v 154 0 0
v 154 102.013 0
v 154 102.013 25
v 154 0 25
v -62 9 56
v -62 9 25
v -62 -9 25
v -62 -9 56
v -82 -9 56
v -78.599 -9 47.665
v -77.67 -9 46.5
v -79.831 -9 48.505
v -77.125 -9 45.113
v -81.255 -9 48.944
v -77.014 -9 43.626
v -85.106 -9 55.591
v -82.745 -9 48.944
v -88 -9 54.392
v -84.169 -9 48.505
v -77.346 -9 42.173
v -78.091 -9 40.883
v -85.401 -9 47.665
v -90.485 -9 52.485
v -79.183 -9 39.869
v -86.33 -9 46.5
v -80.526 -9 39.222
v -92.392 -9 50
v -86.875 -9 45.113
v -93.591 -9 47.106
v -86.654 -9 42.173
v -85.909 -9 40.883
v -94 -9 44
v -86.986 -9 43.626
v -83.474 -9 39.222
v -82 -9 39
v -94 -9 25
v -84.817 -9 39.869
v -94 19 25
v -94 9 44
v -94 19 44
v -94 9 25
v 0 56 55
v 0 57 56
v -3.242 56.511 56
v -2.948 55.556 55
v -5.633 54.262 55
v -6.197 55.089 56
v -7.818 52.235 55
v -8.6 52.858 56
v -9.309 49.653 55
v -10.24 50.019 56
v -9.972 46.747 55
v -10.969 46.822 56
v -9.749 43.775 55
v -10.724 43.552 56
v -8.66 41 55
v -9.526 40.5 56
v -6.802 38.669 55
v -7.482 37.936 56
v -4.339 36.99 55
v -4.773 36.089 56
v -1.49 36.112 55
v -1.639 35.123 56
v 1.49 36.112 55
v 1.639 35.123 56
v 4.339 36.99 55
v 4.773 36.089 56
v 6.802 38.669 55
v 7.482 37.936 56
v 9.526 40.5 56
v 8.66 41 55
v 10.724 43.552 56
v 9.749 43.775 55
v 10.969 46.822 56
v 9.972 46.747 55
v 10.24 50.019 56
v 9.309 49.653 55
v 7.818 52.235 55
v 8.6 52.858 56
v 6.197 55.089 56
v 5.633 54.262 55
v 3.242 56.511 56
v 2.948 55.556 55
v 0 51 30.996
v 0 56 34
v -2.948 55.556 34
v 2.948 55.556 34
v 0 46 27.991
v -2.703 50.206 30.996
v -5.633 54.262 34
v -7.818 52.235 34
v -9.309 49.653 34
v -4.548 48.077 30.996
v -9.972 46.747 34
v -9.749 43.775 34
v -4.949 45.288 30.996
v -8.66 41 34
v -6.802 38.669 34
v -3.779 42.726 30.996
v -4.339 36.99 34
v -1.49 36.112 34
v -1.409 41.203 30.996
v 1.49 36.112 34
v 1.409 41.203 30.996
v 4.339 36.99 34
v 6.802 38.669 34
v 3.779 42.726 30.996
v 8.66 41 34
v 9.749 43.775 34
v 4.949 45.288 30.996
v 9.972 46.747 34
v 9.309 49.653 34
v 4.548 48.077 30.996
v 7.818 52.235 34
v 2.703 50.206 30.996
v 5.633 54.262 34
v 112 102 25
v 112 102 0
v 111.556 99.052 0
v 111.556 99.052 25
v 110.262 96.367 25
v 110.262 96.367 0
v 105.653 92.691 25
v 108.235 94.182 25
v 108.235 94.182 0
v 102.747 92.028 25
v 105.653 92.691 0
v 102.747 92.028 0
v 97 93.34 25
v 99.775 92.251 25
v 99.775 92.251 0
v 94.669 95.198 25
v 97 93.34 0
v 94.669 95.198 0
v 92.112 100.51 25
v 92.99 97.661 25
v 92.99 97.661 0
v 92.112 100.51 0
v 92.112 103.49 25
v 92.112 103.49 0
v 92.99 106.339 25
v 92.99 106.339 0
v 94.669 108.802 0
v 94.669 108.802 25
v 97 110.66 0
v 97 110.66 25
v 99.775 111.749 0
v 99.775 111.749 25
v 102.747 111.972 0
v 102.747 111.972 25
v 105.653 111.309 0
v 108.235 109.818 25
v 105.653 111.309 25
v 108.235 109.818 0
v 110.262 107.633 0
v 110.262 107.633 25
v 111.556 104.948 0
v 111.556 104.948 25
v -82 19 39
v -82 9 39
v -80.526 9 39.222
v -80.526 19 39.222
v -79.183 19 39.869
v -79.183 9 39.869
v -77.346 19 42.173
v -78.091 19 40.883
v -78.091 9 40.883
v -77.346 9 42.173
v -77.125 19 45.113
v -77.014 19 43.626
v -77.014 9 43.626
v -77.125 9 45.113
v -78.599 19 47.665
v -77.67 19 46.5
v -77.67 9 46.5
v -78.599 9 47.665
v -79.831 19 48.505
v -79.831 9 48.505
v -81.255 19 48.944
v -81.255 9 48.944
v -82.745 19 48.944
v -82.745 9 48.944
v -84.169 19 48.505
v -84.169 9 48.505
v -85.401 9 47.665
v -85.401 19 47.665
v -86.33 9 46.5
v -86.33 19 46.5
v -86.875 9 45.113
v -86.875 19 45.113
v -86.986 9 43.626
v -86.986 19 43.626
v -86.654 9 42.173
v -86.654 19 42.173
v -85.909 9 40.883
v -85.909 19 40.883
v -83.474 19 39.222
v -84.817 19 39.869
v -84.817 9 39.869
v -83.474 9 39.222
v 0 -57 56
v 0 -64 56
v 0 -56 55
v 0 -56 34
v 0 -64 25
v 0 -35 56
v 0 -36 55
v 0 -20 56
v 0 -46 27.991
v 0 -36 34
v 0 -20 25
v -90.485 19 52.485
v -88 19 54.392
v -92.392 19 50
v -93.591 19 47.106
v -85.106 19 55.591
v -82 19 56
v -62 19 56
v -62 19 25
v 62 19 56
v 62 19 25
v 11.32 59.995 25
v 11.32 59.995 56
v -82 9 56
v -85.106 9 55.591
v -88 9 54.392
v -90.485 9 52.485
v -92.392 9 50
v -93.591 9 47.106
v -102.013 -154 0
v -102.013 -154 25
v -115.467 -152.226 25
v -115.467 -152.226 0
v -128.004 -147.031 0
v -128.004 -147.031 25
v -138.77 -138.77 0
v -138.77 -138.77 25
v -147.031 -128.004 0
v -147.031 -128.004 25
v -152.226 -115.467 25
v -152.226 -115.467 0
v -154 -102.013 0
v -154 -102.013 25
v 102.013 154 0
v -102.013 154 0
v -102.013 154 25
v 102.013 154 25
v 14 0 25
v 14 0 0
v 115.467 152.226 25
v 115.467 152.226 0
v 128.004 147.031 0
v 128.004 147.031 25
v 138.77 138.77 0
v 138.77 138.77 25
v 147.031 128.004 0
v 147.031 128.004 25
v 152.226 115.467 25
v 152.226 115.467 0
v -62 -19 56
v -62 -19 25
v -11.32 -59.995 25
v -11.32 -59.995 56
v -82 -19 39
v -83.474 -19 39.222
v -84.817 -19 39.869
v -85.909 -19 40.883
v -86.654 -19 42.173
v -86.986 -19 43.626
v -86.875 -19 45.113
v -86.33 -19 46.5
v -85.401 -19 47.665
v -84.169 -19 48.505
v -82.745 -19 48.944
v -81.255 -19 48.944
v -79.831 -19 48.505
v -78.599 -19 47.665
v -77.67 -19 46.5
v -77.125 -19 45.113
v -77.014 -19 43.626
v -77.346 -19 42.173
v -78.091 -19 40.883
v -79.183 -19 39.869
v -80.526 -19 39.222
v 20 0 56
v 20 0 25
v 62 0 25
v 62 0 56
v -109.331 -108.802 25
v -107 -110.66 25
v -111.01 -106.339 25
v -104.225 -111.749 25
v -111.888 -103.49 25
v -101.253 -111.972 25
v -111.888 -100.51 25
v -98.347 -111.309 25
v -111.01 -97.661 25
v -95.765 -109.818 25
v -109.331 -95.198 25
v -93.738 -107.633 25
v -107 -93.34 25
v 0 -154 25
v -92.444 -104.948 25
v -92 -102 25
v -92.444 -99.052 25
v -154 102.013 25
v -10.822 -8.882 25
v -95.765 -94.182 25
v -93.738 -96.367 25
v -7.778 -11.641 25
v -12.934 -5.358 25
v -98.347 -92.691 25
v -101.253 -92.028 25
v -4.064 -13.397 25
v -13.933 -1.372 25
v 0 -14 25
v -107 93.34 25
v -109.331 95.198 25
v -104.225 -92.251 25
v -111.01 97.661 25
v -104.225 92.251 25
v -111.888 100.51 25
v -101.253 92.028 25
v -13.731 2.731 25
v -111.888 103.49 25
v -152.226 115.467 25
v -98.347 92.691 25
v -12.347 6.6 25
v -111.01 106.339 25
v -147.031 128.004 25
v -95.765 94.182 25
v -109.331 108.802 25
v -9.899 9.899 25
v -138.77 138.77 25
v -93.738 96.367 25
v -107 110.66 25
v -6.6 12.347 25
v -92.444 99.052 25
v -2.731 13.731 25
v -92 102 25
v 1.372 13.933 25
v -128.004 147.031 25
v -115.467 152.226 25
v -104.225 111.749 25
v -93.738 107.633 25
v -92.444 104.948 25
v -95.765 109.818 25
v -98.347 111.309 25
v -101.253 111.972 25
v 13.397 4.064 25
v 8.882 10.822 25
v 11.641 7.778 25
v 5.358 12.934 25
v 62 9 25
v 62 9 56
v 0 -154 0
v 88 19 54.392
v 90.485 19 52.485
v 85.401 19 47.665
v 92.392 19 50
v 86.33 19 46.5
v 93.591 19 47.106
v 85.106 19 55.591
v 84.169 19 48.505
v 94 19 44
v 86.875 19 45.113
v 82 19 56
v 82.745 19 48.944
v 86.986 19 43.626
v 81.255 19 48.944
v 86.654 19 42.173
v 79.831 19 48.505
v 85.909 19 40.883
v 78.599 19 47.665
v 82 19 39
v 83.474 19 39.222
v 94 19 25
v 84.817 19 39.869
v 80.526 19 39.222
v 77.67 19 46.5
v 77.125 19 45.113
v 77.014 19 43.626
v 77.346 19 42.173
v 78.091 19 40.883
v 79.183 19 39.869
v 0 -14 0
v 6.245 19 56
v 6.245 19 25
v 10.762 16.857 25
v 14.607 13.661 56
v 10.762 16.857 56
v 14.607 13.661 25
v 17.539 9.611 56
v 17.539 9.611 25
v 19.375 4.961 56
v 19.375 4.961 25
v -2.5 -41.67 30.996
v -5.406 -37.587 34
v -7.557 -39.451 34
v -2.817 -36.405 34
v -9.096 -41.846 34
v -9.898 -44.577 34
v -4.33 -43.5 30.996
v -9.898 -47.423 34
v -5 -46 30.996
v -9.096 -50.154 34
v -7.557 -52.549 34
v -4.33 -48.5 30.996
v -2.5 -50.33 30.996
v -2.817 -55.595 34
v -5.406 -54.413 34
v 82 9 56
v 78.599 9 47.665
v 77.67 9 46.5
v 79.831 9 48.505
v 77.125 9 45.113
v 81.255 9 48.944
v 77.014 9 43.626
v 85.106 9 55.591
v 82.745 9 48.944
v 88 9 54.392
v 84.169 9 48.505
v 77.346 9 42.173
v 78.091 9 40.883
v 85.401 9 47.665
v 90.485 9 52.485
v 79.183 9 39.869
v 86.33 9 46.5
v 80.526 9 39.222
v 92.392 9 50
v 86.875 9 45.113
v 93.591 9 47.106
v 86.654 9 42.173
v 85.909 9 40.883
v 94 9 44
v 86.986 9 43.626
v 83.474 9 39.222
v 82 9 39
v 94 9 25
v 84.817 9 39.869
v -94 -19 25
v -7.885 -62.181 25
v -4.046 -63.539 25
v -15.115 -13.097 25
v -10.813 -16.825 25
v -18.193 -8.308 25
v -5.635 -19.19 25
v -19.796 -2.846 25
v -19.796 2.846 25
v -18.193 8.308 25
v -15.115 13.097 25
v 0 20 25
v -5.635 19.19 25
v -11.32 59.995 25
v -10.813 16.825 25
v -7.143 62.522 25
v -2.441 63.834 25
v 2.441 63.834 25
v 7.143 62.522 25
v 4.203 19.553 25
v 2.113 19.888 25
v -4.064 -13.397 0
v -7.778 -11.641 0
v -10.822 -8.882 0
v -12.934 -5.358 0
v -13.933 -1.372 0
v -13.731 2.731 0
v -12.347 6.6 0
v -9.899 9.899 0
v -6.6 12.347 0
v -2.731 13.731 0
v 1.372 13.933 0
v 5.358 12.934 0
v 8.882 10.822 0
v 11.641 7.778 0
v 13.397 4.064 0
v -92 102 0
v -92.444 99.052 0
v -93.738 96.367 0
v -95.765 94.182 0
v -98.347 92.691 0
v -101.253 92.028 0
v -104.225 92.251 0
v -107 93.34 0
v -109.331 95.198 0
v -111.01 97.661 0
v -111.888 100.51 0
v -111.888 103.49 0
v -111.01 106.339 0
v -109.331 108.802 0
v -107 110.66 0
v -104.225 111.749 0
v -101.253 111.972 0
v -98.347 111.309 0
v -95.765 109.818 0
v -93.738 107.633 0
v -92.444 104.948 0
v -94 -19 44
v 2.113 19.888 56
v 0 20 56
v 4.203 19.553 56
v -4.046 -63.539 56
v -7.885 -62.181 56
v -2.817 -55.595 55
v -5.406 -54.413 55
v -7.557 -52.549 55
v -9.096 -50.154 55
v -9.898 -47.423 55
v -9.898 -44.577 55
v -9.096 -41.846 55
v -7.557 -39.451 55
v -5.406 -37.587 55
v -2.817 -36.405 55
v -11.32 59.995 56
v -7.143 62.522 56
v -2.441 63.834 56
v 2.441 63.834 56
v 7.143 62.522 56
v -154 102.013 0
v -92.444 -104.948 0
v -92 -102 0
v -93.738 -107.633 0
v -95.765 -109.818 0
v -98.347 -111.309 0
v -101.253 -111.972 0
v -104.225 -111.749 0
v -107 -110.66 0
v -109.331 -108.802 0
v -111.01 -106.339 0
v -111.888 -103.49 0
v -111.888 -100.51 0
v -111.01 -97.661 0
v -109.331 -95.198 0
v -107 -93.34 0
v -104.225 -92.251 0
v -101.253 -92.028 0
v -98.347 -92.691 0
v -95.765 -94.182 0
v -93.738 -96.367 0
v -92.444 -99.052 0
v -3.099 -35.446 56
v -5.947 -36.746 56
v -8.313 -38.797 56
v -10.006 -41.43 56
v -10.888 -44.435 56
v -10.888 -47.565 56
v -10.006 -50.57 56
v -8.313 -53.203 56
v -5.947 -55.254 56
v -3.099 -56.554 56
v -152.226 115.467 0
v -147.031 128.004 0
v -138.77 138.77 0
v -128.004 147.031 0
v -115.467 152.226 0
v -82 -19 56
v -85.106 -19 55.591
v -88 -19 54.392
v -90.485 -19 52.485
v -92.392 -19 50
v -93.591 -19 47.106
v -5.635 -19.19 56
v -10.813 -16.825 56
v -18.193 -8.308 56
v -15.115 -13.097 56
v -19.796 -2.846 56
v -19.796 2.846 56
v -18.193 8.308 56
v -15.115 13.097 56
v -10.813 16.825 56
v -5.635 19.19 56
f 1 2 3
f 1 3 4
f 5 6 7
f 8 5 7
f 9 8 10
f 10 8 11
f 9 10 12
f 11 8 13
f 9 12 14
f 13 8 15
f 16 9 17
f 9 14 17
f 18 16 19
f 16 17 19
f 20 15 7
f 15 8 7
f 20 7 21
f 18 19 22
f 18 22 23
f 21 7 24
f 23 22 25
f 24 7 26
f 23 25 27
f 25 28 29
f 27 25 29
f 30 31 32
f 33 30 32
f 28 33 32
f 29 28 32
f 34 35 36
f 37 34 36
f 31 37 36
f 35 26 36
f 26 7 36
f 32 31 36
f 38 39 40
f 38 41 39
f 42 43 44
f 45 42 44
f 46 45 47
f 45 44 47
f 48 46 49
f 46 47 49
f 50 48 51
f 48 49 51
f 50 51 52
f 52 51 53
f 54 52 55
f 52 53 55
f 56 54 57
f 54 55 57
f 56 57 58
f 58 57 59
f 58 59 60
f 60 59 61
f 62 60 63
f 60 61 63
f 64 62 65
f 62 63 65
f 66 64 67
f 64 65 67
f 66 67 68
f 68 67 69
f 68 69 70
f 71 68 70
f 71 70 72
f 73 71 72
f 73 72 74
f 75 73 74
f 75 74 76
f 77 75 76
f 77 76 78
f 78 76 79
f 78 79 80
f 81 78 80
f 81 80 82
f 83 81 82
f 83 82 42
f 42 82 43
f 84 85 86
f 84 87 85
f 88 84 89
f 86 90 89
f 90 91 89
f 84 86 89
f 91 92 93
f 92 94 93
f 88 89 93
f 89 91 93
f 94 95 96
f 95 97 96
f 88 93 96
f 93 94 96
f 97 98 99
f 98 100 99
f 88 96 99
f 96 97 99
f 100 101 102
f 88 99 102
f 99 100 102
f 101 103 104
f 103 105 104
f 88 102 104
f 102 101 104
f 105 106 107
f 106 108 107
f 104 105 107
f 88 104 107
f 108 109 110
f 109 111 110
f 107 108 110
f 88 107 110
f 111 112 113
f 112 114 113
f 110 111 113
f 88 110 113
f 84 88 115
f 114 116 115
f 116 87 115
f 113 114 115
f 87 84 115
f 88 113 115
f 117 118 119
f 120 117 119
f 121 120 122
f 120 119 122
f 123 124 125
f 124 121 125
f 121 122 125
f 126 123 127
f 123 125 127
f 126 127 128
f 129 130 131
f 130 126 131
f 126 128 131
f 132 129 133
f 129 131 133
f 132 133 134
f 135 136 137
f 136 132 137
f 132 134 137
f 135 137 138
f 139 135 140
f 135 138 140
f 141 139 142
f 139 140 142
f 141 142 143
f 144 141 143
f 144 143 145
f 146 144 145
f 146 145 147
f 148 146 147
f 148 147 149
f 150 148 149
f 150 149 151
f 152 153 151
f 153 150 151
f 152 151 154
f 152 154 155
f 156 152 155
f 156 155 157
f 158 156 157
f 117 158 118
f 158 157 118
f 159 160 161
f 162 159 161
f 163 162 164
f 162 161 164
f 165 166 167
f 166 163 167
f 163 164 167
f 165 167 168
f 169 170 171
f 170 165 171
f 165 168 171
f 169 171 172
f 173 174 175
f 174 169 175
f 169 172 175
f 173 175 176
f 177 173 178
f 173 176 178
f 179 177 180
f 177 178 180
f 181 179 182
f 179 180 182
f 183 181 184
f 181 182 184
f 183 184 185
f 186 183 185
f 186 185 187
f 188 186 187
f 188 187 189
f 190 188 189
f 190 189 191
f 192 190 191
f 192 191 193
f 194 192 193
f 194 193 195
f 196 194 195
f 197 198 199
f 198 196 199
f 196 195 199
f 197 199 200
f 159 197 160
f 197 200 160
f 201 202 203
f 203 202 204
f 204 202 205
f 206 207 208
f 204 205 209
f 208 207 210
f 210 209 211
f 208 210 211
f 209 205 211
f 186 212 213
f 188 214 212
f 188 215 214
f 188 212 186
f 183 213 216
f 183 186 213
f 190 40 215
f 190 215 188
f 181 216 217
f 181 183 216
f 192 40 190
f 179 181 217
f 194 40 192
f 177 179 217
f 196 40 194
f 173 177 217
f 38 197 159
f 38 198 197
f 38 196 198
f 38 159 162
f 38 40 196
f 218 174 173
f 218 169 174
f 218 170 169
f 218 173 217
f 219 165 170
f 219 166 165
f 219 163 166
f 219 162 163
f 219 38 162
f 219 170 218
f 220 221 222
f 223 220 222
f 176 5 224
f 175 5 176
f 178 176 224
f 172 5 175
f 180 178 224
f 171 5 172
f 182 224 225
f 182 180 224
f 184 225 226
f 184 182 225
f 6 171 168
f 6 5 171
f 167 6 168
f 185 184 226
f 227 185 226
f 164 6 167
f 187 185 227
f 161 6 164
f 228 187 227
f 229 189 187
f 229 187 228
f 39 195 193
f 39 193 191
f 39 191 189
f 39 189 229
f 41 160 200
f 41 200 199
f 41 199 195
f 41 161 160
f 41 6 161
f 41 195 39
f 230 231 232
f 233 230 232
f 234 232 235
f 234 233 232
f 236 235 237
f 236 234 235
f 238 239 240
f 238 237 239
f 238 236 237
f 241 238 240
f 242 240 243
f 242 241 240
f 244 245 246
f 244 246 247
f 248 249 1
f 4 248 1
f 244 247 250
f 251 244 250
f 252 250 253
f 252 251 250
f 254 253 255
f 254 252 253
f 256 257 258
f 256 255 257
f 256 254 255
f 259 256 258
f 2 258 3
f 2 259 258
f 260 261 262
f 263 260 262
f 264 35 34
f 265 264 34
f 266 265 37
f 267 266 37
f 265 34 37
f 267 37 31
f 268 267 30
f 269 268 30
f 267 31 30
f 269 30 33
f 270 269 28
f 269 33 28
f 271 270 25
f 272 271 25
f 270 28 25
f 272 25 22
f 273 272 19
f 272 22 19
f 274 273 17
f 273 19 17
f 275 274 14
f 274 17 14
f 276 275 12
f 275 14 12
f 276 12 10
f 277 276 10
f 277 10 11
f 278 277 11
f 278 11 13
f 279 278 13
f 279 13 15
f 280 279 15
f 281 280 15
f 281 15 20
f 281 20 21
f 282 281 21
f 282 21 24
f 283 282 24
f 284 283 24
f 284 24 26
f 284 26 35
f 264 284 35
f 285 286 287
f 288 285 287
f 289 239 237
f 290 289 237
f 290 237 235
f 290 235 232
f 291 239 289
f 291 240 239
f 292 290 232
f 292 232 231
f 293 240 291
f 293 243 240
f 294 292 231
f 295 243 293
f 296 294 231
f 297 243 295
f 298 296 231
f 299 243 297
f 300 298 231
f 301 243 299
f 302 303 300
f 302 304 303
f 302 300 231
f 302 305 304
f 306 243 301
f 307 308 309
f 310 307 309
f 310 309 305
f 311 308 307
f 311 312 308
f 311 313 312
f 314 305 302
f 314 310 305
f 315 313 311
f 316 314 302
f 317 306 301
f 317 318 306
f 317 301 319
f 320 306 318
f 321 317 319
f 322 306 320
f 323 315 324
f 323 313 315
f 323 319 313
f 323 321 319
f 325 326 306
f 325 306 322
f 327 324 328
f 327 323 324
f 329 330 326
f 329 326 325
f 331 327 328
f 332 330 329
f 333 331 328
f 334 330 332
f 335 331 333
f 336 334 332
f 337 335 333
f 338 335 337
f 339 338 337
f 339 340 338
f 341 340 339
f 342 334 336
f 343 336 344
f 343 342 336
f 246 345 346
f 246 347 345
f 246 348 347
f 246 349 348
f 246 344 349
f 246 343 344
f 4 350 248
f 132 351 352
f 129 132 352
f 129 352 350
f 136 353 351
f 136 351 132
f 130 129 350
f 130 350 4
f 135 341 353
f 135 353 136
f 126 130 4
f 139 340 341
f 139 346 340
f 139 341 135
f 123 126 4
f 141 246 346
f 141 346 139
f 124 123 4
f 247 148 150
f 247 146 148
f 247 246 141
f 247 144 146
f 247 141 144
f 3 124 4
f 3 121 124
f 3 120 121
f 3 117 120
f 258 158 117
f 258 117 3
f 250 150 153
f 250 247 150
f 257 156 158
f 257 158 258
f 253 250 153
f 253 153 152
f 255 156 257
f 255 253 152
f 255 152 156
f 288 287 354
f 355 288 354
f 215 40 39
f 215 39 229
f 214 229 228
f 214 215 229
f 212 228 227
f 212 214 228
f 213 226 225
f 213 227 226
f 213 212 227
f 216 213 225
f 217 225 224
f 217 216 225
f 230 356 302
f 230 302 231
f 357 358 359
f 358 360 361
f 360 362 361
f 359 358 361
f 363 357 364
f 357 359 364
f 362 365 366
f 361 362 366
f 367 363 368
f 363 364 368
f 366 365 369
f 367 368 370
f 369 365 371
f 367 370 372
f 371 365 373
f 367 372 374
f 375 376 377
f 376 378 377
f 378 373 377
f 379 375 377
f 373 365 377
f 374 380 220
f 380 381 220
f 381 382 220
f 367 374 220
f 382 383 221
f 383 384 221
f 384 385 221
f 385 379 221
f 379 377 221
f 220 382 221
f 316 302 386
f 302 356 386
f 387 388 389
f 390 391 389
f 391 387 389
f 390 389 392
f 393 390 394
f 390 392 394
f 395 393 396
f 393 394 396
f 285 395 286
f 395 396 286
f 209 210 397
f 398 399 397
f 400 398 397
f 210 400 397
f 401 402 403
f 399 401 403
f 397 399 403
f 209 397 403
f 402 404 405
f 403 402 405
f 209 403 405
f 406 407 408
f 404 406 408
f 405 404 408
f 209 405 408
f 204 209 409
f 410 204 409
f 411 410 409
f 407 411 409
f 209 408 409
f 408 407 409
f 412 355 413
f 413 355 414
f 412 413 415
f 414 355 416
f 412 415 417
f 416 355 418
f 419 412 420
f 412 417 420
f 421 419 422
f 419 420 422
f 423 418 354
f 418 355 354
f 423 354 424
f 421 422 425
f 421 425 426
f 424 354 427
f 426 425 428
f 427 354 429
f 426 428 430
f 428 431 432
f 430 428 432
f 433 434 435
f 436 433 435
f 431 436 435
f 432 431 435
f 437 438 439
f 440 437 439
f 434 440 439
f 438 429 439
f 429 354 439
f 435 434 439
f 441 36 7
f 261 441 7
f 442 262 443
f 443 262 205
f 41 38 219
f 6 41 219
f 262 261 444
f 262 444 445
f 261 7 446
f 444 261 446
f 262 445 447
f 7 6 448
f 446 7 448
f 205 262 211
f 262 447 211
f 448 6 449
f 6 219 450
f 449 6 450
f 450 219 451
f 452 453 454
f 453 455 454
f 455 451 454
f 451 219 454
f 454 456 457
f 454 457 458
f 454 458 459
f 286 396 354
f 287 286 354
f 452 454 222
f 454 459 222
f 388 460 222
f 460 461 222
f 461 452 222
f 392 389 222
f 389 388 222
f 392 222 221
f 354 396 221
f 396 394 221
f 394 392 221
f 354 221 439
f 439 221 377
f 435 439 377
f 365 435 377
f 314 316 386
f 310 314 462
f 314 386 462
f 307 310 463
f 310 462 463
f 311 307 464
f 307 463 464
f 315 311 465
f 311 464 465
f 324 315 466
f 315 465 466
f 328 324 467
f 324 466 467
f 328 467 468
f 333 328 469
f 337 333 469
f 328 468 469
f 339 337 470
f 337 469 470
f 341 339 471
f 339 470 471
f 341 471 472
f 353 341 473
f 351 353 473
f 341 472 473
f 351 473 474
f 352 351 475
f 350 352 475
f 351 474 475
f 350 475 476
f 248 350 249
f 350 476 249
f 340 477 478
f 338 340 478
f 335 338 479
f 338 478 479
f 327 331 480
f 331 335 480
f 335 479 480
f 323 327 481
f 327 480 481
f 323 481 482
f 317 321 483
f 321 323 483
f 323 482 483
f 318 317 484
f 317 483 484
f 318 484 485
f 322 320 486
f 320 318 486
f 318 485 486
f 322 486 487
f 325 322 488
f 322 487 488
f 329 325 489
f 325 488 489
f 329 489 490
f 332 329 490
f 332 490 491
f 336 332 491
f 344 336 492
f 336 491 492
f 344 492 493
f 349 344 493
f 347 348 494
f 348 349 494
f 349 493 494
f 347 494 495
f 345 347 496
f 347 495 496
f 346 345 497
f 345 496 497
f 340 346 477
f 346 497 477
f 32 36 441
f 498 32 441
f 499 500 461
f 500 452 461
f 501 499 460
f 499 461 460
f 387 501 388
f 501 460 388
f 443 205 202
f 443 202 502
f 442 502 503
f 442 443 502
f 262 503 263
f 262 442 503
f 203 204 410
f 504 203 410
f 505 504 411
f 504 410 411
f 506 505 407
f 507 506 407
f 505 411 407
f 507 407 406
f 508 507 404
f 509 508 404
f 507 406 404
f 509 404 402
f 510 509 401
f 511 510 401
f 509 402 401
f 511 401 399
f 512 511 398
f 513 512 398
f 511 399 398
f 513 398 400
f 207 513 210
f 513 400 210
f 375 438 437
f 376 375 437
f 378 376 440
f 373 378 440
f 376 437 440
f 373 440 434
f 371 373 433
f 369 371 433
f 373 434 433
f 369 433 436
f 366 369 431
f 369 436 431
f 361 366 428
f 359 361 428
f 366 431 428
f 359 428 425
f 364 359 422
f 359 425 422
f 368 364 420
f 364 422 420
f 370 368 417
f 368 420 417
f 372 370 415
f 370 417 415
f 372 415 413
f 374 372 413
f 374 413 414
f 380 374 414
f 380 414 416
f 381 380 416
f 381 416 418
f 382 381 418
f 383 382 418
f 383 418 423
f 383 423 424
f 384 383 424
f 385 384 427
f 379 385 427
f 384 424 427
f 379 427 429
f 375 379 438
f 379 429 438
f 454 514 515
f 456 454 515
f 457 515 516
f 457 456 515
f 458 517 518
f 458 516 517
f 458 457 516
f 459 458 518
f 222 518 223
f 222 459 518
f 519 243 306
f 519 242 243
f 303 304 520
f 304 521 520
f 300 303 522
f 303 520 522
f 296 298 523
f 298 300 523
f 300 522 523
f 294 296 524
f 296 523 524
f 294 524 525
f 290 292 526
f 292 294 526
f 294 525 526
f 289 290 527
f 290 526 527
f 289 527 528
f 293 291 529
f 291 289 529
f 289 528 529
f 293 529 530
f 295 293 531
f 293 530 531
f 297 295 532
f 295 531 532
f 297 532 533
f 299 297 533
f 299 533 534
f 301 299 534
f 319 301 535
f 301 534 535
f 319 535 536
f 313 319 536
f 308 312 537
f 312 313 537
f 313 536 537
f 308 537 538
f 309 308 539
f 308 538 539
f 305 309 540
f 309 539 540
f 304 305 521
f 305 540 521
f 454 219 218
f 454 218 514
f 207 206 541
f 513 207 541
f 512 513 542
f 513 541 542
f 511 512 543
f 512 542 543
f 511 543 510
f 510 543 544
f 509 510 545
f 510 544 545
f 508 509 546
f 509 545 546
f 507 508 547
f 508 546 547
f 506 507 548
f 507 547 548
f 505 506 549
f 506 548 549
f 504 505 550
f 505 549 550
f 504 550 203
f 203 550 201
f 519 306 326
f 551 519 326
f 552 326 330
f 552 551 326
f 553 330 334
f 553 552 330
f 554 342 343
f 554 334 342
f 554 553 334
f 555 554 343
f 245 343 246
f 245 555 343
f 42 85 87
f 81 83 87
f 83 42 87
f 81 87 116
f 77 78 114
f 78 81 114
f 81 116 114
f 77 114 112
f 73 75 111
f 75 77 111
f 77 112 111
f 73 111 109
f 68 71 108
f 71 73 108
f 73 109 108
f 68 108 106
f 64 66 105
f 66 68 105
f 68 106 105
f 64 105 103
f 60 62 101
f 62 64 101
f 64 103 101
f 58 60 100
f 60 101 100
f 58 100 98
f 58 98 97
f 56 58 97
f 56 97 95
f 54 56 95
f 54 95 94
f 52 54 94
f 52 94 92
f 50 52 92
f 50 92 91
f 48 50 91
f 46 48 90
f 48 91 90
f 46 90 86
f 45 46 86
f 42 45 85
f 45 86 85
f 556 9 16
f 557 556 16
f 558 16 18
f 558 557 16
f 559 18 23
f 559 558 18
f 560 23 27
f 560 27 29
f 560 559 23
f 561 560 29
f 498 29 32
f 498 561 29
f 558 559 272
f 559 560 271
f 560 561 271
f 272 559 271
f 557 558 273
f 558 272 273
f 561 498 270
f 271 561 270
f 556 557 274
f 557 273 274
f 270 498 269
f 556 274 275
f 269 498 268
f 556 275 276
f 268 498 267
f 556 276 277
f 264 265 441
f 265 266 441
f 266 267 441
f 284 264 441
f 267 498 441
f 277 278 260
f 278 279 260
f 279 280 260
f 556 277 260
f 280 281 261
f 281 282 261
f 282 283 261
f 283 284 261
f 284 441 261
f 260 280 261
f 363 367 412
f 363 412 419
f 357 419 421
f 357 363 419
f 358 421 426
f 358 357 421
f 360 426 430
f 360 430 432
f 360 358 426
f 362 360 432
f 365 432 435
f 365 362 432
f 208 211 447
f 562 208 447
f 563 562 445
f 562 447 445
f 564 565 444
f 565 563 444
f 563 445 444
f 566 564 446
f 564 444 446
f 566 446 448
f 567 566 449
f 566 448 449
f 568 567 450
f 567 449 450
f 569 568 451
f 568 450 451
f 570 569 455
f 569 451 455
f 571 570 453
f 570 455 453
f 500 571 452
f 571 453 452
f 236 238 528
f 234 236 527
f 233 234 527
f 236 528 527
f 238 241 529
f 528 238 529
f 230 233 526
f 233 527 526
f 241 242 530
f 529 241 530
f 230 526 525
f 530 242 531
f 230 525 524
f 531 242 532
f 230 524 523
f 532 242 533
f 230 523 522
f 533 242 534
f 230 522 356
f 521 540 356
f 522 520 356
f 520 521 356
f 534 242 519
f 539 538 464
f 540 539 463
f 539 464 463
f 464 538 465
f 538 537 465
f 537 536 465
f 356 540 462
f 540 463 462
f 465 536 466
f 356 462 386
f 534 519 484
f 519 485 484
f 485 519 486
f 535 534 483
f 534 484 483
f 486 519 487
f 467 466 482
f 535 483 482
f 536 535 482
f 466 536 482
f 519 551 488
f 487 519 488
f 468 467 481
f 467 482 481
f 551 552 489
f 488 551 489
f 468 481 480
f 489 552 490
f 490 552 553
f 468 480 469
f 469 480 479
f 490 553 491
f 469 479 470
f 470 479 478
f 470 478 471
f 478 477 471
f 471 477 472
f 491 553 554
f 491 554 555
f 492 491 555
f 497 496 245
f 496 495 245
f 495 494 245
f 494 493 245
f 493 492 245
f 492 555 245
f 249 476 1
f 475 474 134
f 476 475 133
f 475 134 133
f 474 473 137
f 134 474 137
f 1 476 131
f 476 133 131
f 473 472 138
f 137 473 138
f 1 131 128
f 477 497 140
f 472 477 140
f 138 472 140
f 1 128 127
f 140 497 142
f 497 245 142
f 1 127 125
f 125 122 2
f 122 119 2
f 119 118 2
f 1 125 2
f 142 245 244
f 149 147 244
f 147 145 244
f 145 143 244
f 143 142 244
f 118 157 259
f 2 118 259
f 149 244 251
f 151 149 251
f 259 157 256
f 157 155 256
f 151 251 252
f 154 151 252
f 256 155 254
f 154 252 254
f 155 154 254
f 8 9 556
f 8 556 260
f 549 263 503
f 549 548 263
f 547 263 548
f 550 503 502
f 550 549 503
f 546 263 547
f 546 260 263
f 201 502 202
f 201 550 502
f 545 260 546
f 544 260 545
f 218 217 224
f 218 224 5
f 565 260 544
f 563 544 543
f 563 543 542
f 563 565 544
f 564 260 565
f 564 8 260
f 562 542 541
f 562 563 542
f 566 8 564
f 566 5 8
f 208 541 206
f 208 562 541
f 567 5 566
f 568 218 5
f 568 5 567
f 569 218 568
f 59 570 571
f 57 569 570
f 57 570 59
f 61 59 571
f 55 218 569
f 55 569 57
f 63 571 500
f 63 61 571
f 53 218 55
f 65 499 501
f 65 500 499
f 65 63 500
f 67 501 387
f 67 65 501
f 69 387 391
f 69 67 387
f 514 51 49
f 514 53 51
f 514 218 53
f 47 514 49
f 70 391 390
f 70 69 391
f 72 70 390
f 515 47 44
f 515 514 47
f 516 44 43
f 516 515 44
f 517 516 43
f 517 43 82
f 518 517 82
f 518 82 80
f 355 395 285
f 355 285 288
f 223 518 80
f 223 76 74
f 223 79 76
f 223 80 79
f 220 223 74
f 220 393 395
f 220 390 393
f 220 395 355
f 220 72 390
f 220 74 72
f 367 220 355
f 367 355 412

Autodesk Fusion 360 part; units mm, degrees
sketch "Sketch2" plane through (0, 0, 0) normal (0, 0, 1) x (1, 0, 0)
  line L0 (102.0126, -154) -> (-102.0126, -154)
  line L1 (-154, -102.0126) -> (-154, 102.0126)
  line L2 (-102.0126, 154) -> (102.0126, 154)
  line L3 (154, 102.0126) -> (154, -102.0126)
  line L4 (138.7696, -138.7696) -> (-138.7696, 138.7696) construction
  line L5 (-138.7696, -138.7696) -> (138.7696, 138.7696) construction
  line L6 (0, 154) -> (-102, 154)
  line L7 (-154, 0) -> (-154, 102)
  circle A0 centre (-102, 102) radius 10
  circle A1 centre (102, 102) radius 10
  line L8 (-154, 0) -> (154, 0)
  circle A2 centre (-102, -102) radius 10
  circle A3 centre (102, -102) radius 10
  arc A4 (-101.9874, 154) -> (-154, 101.9874) centre (-102, 102) ccw
  arc A5 (154, 101.9874) -> (101.9874, 154) centre (102, 102) ccw
  arc A6 (101.9874, -154) -> (154, -101.9874) centre (102, -102) ccw
  arc A7 (-154, -101.9874) -> (-101.9874, -154) centre (-102, -102) ccw
  circle A8 centre (0, 0) radius 14
  dimension "d3" = 102
  dimension "d4" = 102
  dimension "d5" = 20
  dimension "d7" = 104
  dimension "d8" = 28
extrude "Extrude1" add sketch "Sketch2" along normal blind 25 contours L0 L1 L3 L8 A6 A7 A8 | L1 L2 L3 L6 L7 L8 A4 A5 A8 makes body 1
ref_plane "WorkPlane2" through (0, 77, 25) normal (0, 0, 1) x (1, 0, 0)
sketch "Sketch5" plane through (0, 77, 25) normal (0, 0, 1) x (1, 0, 0)
  circle A0 centre (0, -77) radius 20
  line L0 (0, -77) -> (20, -77)
  line L1 (0, -77) -> (0, -57)
  line L2 (0, -77) -> (62, -77)
  line L3 (62, -77) -> (62, -86)
  line L4 (62, -86) -> (94, -86)
  line L5 (94, -86) -> (94, -96)
  line L6 (94, -96) -> (62, -96)
  line L7 (0, -77) -> (0, -49)
  line L8 (62, -68) -> (94, -68)
  line L9 (94, -58) -> (62, -58)
  line L10 (94, -68) -> (94, -58)
  line L11 (62, -77) -> (62, -68)
  line L12 (62, -58) -> (11.3203, -17.0053)
  arc A1 (11.3203, -17.0053) -> (-11.3203, -17.0053) centre (0, -31) ccw
  line L13 (-94, -58) -> (-62, -58)
  line L14 (-62, -68) -> (-94, -68)
  line L15 (-94, -68) -> (-94, -58)
  line L16 (-62, -77) -> (-62, -68)
  line L17 (-62, -77) -> (-62, -86)
  line L18 (-62, -86) -> (-94, -86)
  line L19 (-94, -86) -> (-94, -96)
  line L20 (-94, -96) -> (-62, -96)
  line L21 (-62, -58) -> (-11.3203, -17.0053)
  line L22 (-62, -96) -> (-11.3203, -136.9947)
  arc A2 (-11.3203, -136.9947) -> (11.3203, -136.9947) centre (0, -123) ccw
  line L23 (62, -96) -> (11.3203, -136.9947)
  line L24 (0, -58) -> (26, -58)
  dimension "d22" = 40
  dimension "d23" = 62
  dimension "d24" = 9
  dimension "d25" = 32
  dimension "d26" = 10
  dimension "d27" = 32
  dimension "d28" = 46
  dimension "d29" = 36
  dimension "d58" = 26
extrude "Extrude2" add sketch "Sketch5" along normal blind 31 separate body makes body 2
fillet "Fillet1" radius 12 1 edges at (94, -14, 56) on bodies 2
fillet "Fillet2" radius 12 1 edges at (94, 14, 56) on bodies 2
fillet "Fillet3" radius 12 1 edges at (-94, -14, 56) on bodies 2
fillet "Fillet4" radius 12 1 edges at (-94, 14, 56) on bodies 2
hole "Hole1" at (0, -46, 56) direction (0, 0, -1) diameter 20 depth 22 tip angle 118 countersink diameter 22 countersink angle 90 bodies 2
mirror "Mirror1" about plane through (0, 0, 0) normal (0, 1, 0) of "Hole1"
hole "Hole2" at (-82, -19, 44) direction (0, 1, 0) diameter 10 depth 10 tip angle 118 bodies 2
mirror "Mirror2" about plane through (0, 0, 0) normal (1, 0, 0) of "Hole2"
mirror "Mirror3" about plane through (0, 0, 0) normal (0, 1, 0) of "Mirror2", "Hole2"
sketch "Sketch6" plane through (0, 0, 0) normal (0, 0, 1) x (1, 0, 0)
  line L0 (0, 0) -> (160, 0)
  line L1 (160, 0) -> (160, -170)
  line L2 (160, -170) -> (0, -170)
  line L3 (0, -170) -> (0, 0)
extrude "Extrude3" cut sketch "Sketch6" along normal blind 70 bodies 1 2
